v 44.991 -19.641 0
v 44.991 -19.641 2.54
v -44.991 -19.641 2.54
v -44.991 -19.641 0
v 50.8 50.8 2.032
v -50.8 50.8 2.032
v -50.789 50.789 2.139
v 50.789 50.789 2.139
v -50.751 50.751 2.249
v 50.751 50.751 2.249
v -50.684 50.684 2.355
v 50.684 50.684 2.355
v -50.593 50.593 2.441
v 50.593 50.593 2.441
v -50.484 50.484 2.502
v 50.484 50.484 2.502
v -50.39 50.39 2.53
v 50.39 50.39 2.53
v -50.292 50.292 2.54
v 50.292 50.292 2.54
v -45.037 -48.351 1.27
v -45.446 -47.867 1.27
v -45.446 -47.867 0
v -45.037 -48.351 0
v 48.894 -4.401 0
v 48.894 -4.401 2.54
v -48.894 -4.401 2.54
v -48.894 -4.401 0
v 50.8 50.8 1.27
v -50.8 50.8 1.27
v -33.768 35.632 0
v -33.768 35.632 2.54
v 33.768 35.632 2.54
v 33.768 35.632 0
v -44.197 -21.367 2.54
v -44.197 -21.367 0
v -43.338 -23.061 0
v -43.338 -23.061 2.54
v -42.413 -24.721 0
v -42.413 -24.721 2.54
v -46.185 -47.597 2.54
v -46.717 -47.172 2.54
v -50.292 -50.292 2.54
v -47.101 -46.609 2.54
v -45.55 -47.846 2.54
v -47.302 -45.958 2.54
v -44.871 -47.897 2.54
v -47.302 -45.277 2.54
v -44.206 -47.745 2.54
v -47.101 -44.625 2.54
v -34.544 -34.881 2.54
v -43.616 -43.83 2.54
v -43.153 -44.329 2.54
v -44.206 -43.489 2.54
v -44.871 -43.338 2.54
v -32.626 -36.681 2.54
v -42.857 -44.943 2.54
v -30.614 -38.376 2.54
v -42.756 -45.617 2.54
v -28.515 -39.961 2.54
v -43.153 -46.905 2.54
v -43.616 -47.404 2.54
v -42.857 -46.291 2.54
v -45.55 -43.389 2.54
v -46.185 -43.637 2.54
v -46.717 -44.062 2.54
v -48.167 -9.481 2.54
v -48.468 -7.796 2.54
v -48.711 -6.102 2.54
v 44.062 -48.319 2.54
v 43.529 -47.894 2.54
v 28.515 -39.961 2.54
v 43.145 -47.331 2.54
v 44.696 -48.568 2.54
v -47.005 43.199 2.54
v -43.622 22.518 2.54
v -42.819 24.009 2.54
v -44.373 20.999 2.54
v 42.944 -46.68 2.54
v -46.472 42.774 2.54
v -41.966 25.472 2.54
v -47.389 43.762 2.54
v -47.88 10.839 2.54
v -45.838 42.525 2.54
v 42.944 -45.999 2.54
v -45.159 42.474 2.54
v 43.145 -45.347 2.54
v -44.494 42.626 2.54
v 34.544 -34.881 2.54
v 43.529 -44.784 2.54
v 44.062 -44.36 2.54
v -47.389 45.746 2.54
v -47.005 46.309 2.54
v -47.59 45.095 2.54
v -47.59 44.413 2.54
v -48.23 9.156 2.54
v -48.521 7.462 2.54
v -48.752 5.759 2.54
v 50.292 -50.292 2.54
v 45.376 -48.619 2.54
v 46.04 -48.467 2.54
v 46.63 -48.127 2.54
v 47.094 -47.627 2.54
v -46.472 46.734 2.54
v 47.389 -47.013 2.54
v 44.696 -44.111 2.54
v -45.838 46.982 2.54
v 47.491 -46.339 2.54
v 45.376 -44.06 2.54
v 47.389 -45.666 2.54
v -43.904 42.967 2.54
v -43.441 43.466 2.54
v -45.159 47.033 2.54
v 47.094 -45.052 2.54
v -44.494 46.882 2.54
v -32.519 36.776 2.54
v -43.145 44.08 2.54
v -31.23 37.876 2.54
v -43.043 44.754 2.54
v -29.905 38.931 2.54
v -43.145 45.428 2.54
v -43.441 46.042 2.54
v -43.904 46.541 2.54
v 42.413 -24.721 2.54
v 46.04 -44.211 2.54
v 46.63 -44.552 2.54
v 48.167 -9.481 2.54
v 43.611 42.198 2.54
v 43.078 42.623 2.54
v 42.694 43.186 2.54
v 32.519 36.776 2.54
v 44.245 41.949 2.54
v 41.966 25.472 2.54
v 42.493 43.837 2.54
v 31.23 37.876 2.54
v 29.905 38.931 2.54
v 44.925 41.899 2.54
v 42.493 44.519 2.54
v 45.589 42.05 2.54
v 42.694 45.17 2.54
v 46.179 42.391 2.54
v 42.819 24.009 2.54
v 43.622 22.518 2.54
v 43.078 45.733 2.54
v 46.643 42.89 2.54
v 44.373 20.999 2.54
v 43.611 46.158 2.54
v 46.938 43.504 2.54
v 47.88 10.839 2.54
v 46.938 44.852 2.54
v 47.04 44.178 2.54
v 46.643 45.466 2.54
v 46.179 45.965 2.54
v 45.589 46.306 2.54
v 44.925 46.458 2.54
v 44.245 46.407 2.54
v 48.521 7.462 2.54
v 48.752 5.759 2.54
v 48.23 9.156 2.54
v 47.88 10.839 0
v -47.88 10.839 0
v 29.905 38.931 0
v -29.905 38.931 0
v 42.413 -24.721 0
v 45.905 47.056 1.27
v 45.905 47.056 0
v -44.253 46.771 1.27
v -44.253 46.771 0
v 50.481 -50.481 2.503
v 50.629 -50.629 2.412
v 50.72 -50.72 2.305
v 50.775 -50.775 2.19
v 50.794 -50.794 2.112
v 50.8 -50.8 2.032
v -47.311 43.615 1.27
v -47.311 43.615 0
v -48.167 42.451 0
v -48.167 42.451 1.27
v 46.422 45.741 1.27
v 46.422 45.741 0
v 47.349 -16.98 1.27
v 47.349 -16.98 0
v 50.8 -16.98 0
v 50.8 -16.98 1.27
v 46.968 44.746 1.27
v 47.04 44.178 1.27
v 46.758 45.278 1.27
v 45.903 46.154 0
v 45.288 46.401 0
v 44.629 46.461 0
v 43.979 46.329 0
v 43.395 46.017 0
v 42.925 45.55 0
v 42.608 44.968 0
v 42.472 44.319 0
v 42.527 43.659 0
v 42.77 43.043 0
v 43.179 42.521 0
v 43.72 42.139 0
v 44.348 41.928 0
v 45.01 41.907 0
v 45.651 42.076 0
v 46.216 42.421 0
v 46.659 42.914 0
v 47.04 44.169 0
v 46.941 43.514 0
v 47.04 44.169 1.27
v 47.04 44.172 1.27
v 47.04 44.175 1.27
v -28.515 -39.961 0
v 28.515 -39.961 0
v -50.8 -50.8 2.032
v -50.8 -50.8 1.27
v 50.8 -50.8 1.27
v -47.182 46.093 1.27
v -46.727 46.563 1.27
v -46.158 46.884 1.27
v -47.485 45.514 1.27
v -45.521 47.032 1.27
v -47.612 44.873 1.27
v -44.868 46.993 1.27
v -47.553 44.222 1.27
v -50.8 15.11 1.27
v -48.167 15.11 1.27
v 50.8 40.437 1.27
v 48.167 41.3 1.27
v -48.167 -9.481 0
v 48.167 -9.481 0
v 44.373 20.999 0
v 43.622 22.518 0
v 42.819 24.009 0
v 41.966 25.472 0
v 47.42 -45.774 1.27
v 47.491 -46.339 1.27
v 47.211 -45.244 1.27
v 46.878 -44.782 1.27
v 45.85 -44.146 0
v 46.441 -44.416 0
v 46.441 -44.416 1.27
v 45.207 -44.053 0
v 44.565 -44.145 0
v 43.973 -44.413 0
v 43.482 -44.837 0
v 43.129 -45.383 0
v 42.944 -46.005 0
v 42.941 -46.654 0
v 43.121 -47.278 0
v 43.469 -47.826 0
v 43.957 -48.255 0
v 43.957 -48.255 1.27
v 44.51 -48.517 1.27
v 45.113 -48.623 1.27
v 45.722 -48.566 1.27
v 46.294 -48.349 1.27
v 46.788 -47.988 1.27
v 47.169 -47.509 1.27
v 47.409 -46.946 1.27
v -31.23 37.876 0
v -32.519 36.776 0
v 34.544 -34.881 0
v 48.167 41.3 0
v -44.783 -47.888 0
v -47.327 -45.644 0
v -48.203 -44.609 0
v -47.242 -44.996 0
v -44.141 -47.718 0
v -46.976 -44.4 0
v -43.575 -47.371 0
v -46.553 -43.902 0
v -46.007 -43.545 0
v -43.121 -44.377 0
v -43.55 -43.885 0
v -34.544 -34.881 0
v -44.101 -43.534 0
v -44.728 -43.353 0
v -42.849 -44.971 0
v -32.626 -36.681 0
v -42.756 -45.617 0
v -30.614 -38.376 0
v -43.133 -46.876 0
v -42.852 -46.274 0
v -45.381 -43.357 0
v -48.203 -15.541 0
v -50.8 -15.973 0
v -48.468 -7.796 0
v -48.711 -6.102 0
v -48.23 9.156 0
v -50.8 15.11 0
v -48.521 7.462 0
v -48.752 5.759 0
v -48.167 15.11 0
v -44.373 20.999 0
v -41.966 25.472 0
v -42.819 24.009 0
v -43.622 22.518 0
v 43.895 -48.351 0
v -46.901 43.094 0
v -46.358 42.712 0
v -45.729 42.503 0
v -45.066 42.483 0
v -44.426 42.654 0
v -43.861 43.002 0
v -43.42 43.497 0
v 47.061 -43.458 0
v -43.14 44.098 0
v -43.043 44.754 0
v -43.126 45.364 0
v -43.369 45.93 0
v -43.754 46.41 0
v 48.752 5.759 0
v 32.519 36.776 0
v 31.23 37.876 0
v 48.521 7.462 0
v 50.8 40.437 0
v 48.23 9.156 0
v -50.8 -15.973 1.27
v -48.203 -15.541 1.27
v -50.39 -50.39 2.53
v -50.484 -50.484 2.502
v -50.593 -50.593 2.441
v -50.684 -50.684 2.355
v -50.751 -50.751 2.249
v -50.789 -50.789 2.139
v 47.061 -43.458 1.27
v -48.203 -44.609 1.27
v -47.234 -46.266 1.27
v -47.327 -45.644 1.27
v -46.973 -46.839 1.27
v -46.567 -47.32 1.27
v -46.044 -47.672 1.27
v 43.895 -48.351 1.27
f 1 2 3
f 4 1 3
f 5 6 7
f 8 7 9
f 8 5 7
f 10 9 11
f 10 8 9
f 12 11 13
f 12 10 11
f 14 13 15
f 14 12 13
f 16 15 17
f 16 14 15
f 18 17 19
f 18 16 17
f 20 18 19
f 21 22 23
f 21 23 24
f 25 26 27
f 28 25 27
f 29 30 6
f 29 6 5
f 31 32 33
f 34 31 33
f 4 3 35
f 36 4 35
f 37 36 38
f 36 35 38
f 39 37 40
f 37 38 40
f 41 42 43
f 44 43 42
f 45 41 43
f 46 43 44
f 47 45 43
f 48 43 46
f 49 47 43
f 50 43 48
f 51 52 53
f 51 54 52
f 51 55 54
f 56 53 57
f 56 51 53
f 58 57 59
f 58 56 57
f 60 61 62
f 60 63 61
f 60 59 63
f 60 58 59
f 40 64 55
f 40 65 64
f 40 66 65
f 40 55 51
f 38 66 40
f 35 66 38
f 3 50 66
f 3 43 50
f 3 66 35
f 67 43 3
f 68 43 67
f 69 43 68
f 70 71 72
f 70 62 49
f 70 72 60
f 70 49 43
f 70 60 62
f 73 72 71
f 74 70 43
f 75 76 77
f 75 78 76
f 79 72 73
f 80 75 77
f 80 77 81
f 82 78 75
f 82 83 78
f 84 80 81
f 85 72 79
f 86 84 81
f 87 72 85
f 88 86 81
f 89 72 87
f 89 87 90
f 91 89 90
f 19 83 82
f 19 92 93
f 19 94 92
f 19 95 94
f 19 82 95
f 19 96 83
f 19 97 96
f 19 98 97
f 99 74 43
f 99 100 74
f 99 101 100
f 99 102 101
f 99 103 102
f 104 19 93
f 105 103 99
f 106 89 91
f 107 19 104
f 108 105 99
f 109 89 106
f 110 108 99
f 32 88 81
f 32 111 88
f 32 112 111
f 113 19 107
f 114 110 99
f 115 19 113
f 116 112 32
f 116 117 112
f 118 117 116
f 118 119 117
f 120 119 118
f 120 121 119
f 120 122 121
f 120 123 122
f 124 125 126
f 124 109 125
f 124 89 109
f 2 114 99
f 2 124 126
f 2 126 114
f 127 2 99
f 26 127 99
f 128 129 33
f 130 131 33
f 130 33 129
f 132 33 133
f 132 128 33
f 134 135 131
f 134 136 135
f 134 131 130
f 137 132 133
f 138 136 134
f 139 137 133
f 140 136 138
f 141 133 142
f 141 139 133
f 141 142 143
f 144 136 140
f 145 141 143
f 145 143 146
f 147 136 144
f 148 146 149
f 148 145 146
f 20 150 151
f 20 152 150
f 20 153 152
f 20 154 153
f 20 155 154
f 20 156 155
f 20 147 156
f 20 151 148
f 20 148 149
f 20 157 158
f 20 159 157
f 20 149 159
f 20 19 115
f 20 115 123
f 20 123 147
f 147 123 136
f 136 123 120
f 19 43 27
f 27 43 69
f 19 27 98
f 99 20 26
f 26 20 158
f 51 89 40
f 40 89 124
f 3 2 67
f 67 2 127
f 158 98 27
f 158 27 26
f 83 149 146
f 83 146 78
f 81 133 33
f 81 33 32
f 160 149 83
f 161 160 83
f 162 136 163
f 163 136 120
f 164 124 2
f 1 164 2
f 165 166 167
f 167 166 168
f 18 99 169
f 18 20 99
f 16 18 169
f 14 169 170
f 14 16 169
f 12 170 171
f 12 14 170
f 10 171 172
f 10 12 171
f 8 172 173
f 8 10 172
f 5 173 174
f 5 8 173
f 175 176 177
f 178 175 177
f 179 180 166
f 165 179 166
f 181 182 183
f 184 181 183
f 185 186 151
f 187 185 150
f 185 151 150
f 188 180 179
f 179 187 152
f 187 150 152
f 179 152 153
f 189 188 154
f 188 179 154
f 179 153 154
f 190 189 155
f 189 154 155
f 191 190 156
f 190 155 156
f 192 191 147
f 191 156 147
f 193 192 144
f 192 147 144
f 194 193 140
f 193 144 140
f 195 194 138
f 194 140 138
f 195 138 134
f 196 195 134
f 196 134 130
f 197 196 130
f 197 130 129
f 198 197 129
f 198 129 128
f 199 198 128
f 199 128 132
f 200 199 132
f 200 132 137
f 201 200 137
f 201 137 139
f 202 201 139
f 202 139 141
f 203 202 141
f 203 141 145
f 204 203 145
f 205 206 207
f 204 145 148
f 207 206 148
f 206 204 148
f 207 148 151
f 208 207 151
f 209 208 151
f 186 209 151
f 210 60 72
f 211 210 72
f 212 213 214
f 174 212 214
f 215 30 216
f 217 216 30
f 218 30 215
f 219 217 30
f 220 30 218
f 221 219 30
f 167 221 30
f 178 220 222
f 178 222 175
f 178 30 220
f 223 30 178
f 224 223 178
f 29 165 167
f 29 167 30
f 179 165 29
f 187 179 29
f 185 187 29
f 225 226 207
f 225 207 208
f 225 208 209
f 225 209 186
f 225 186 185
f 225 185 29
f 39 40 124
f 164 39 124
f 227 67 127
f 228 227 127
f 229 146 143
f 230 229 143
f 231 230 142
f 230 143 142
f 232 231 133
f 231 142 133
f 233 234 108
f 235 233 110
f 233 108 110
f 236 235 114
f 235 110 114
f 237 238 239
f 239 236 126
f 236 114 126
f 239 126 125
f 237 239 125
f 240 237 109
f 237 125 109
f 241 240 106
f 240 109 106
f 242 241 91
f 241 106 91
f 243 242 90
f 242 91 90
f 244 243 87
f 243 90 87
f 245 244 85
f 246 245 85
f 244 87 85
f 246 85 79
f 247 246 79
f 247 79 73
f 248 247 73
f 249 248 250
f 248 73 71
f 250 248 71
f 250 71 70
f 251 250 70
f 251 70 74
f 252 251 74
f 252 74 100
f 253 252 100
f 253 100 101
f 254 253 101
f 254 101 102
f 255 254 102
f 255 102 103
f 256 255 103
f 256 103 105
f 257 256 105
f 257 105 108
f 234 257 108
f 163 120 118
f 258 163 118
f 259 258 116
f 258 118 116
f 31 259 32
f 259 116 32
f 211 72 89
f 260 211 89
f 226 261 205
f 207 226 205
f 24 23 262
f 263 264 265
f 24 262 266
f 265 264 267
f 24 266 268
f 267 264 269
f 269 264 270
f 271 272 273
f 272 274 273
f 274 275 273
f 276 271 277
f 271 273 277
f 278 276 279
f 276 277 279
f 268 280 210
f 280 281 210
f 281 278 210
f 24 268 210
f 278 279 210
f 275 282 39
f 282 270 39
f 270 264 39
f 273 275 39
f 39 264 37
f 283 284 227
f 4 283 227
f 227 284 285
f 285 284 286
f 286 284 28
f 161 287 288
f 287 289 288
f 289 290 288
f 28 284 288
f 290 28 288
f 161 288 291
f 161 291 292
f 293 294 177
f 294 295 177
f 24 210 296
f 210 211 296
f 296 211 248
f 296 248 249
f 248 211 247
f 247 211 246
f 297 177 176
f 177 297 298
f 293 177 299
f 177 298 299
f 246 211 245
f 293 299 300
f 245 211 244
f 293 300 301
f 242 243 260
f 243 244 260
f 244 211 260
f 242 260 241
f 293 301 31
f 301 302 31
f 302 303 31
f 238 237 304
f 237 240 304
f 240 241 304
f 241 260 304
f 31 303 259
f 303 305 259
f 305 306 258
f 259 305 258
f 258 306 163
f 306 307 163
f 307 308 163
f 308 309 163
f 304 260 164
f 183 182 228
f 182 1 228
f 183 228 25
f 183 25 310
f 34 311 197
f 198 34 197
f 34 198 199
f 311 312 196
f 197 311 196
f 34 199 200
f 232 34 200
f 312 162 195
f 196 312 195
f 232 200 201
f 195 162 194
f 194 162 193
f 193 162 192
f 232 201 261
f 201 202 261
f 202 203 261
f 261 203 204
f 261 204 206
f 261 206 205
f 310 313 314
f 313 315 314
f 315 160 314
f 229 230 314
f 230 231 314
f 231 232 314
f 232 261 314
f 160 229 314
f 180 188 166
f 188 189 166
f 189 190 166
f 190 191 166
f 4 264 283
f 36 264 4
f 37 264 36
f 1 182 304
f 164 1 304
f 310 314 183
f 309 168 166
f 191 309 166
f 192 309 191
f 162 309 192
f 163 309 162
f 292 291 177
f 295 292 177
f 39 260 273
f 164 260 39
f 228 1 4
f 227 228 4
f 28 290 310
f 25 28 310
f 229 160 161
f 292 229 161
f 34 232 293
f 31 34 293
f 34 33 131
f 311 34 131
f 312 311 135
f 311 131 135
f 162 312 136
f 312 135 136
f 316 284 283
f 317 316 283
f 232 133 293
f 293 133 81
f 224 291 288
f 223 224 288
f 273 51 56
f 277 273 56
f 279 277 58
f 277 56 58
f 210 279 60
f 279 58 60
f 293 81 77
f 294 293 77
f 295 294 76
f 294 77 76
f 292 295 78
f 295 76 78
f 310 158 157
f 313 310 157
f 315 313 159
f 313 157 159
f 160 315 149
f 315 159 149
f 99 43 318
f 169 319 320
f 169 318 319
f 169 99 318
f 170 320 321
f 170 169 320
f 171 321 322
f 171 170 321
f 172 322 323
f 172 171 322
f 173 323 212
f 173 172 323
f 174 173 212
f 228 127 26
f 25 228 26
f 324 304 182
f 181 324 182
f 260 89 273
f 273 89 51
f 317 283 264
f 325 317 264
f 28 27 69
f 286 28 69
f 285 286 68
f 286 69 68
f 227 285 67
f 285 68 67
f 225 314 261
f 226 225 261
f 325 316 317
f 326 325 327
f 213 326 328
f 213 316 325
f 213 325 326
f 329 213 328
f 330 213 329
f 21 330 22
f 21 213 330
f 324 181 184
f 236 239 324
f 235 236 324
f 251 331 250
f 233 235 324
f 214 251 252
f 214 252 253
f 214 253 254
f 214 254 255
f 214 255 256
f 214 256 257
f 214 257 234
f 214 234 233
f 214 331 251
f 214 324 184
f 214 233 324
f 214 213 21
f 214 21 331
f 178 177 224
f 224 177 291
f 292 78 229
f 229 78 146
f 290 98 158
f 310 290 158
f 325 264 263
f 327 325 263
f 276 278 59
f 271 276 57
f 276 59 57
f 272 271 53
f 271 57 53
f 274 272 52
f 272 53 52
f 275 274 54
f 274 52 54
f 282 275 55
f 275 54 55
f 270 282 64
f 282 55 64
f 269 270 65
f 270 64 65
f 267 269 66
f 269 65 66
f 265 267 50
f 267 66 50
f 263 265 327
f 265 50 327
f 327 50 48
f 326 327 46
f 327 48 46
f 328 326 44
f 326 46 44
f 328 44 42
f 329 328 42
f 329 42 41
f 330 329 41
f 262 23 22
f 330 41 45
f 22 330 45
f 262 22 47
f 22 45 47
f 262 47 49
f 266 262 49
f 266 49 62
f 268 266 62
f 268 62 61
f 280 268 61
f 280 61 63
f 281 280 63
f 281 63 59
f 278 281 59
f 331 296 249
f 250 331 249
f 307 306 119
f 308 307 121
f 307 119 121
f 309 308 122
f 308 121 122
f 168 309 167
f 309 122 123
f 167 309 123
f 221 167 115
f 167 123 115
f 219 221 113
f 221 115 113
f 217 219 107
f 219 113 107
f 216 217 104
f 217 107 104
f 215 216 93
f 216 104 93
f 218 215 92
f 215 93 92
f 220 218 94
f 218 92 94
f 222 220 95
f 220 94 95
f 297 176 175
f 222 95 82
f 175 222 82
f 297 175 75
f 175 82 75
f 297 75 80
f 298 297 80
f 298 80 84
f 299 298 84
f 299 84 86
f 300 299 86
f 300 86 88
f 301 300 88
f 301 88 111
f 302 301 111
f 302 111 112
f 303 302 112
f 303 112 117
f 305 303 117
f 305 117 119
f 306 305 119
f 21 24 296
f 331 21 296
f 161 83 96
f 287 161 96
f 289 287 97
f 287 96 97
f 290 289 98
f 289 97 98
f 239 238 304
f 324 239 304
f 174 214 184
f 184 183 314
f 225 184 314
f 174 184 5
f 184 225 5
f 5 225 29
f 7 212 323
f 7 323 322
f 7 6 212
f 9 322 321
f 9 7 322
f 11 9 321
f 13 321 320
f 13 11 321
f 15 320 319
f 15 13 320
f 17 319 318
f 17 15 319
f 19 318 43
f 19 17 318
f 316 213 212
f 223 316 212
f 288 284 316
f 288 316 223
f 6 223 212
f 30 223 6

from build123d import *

# Parameters (mm, degrees)
F0_W      = 101.6
F0_H      = 101.6
F0_R      = 50.2793
F1_DEPTH  = 2.54
F3_DEPTH  = 2.541
F5_DEPTH  = 1.27
F6_R      = 0.508
F7_R      = 2.286
F8_DEPTH  = 2.541
F9_R      = 2.286
F10_DEPTH = 2.541


with BuildPart() as f1:
    # F0 (on Top) → F1 (new body)
    with BuildSketch(Plane.XY):
        Rectangle(F0_W, F0_H)
        Circle(F0_R, mode=Mode.SUBTRACT)
        Circle(F0_R)
    extrude(amount=F1_DEPTH)

    # F2 (on face) → F3 (cut, through all)
    with BuildSketch(Plane.XY.offset(2.54)):
        with BuildLine():
            Line((-33.768142, 35.632432), (33.768142, 35.632432))
            ThreePointArc((33.768142, 35.632432), (31.879279, 37.331879), (29.905016, 38.931319))
            Line((29.905016, 38.931319), (-29.905016, 38.931319))
            ThreePointArc((-29.905016, 38.931319), (-31.879279, 37.331879), (-33.768142, 35.632432))
        make_face()
        with BuildLine():
            Line((-44.373298, 20.999238), (44.373298, 20.999238))
            ThreePointArc((44.373298, 20.999238), (43.227357, 23.266999), (41.965615, 25.472432))
            Line((41.965615, 25.472432), (-41.965615, 25.472432))
            ThreePointArc((-41.965615, 25.472432), (-43.227357, 23.266999), (-44.373298, 20.999238))
        make_face()
        with BuildLine():
            Line((-48.752321, 5.759238), (48.752321, 5.759238))
            ThreePointArc((48.752321, 5.759238), (48.382744, 8.310698), (47.87973, 10.839238))
            Line((47.87973, 10.839238), (-47.87973, 10.839238))
            ThreePointArc((-47.87973, 10.839238), (-48.382744, 8.310698), (-48.752321, 5.759238))
        make_face()
        with BuildLine():
            Line((48.167134, -9.480762), (48.893669, -4.400762))
            Line((48.893669, -4.400762), (-48.893669, -4.400762))
            ThreePointArc((-48.893669, -4.400762), (-48.596826, -6.950262), (-48.167134, -9.480762))
            Line((-48.167134, -9.480762), (48.167134, -9.480762))
        make_face()
        with BuildLine():
            Line((42.412752, -24.720762), (44.991089, -19.640762))
            Line((44.991089, -19.640762), (-44.991089, -19.640762))
            ThreePointArc((-44.991089, -19.640762), (-43.775672, -22.218194), (-42.412752, -24.720762))
            Line((-42.412752, -24.720762), (42.412752, -24.720762))
        make_face()
        with BuildLine():
            Line((28.514823, -39.960762), (34.544031, -34.880762))
            Line((34.544031, -34.880762), (-34.544031, -34.880762))
            ThreePointArc((-34.544031, -34.880762), (-31.631572, -37.541993), (-28.514823, -39.960762))
            Line((-28.514823, -39.960762), (28.514823, -39.960762))
        make_face()
    extrude(amount=-F3_DEPTH, mode=Mode.SUBTRACT)

    # F4 (on face) → F5 (cut)
    with BuildSketch(Plane(origin=(0, 0, 0), x_dir=(1, 0, 0), z_dir=(0, 0, -1))):
        Polygon((-48.20291, 44.609038), (-45.037047, 48.350511), (43.894938, 48.350511), (47.060798, 43.457819), (47.348599, 16.979685), (50.8, 16.979685), (50.8, 50.8), (-50.8, 50.8), (-50.8, 15.97322), (-48.20291, 15.540657), align=None)
        Polygon((-48.167134, -15.109803), (-50.8, -15.109803), (-50.8, -50.8), (50.8, -50.8), (50.8, -40.436711), (48.167134, -41.300129), (45.905016, -47.056243), (-44.991089, -46.768438), (-48.167134, -42.451348), align=None)
    extrude(amount=-F5_DEPTH, mode=Mode.SUBTRACT)

    # F6
    f6_edges = [f1.edges().sort_by_distance(p)[0] for p in [
        (0, 50.8, 2.54),
        (-50.8, 0, 2.54),
        (0, -50.8, 2.54),
        (50.8, 0, 2.54),
    ]]
    fillet(f6_edges, radius=F6_R)

    # F7 (on face) → F8 (cut, through all)
    with BuildSketch(Plane.XY.offset(2.54)):
        with Locations((-45.329407, 44.753794)):
            Circle(F7_R)
        with Locations((44.753794, 44.178184)):
            Circle(F7_R)
        with Locations((45.204923, -46.339341)):
            Circle(F7_R)
    extrude(amount=-F8_DEPTH, mode=Mode.SUBTRACT)

    # F9 (on face) → F10 (cut, through all)
    with BuildSketch(Plane.XY.offset(2.54)):
        with Locations((-45.041602, -45.617212)):
            Circle(F9_R)
    extrude(amount=-F10_DEPTH, mode=Mode.SUBTRACT)


solid = f1.part
